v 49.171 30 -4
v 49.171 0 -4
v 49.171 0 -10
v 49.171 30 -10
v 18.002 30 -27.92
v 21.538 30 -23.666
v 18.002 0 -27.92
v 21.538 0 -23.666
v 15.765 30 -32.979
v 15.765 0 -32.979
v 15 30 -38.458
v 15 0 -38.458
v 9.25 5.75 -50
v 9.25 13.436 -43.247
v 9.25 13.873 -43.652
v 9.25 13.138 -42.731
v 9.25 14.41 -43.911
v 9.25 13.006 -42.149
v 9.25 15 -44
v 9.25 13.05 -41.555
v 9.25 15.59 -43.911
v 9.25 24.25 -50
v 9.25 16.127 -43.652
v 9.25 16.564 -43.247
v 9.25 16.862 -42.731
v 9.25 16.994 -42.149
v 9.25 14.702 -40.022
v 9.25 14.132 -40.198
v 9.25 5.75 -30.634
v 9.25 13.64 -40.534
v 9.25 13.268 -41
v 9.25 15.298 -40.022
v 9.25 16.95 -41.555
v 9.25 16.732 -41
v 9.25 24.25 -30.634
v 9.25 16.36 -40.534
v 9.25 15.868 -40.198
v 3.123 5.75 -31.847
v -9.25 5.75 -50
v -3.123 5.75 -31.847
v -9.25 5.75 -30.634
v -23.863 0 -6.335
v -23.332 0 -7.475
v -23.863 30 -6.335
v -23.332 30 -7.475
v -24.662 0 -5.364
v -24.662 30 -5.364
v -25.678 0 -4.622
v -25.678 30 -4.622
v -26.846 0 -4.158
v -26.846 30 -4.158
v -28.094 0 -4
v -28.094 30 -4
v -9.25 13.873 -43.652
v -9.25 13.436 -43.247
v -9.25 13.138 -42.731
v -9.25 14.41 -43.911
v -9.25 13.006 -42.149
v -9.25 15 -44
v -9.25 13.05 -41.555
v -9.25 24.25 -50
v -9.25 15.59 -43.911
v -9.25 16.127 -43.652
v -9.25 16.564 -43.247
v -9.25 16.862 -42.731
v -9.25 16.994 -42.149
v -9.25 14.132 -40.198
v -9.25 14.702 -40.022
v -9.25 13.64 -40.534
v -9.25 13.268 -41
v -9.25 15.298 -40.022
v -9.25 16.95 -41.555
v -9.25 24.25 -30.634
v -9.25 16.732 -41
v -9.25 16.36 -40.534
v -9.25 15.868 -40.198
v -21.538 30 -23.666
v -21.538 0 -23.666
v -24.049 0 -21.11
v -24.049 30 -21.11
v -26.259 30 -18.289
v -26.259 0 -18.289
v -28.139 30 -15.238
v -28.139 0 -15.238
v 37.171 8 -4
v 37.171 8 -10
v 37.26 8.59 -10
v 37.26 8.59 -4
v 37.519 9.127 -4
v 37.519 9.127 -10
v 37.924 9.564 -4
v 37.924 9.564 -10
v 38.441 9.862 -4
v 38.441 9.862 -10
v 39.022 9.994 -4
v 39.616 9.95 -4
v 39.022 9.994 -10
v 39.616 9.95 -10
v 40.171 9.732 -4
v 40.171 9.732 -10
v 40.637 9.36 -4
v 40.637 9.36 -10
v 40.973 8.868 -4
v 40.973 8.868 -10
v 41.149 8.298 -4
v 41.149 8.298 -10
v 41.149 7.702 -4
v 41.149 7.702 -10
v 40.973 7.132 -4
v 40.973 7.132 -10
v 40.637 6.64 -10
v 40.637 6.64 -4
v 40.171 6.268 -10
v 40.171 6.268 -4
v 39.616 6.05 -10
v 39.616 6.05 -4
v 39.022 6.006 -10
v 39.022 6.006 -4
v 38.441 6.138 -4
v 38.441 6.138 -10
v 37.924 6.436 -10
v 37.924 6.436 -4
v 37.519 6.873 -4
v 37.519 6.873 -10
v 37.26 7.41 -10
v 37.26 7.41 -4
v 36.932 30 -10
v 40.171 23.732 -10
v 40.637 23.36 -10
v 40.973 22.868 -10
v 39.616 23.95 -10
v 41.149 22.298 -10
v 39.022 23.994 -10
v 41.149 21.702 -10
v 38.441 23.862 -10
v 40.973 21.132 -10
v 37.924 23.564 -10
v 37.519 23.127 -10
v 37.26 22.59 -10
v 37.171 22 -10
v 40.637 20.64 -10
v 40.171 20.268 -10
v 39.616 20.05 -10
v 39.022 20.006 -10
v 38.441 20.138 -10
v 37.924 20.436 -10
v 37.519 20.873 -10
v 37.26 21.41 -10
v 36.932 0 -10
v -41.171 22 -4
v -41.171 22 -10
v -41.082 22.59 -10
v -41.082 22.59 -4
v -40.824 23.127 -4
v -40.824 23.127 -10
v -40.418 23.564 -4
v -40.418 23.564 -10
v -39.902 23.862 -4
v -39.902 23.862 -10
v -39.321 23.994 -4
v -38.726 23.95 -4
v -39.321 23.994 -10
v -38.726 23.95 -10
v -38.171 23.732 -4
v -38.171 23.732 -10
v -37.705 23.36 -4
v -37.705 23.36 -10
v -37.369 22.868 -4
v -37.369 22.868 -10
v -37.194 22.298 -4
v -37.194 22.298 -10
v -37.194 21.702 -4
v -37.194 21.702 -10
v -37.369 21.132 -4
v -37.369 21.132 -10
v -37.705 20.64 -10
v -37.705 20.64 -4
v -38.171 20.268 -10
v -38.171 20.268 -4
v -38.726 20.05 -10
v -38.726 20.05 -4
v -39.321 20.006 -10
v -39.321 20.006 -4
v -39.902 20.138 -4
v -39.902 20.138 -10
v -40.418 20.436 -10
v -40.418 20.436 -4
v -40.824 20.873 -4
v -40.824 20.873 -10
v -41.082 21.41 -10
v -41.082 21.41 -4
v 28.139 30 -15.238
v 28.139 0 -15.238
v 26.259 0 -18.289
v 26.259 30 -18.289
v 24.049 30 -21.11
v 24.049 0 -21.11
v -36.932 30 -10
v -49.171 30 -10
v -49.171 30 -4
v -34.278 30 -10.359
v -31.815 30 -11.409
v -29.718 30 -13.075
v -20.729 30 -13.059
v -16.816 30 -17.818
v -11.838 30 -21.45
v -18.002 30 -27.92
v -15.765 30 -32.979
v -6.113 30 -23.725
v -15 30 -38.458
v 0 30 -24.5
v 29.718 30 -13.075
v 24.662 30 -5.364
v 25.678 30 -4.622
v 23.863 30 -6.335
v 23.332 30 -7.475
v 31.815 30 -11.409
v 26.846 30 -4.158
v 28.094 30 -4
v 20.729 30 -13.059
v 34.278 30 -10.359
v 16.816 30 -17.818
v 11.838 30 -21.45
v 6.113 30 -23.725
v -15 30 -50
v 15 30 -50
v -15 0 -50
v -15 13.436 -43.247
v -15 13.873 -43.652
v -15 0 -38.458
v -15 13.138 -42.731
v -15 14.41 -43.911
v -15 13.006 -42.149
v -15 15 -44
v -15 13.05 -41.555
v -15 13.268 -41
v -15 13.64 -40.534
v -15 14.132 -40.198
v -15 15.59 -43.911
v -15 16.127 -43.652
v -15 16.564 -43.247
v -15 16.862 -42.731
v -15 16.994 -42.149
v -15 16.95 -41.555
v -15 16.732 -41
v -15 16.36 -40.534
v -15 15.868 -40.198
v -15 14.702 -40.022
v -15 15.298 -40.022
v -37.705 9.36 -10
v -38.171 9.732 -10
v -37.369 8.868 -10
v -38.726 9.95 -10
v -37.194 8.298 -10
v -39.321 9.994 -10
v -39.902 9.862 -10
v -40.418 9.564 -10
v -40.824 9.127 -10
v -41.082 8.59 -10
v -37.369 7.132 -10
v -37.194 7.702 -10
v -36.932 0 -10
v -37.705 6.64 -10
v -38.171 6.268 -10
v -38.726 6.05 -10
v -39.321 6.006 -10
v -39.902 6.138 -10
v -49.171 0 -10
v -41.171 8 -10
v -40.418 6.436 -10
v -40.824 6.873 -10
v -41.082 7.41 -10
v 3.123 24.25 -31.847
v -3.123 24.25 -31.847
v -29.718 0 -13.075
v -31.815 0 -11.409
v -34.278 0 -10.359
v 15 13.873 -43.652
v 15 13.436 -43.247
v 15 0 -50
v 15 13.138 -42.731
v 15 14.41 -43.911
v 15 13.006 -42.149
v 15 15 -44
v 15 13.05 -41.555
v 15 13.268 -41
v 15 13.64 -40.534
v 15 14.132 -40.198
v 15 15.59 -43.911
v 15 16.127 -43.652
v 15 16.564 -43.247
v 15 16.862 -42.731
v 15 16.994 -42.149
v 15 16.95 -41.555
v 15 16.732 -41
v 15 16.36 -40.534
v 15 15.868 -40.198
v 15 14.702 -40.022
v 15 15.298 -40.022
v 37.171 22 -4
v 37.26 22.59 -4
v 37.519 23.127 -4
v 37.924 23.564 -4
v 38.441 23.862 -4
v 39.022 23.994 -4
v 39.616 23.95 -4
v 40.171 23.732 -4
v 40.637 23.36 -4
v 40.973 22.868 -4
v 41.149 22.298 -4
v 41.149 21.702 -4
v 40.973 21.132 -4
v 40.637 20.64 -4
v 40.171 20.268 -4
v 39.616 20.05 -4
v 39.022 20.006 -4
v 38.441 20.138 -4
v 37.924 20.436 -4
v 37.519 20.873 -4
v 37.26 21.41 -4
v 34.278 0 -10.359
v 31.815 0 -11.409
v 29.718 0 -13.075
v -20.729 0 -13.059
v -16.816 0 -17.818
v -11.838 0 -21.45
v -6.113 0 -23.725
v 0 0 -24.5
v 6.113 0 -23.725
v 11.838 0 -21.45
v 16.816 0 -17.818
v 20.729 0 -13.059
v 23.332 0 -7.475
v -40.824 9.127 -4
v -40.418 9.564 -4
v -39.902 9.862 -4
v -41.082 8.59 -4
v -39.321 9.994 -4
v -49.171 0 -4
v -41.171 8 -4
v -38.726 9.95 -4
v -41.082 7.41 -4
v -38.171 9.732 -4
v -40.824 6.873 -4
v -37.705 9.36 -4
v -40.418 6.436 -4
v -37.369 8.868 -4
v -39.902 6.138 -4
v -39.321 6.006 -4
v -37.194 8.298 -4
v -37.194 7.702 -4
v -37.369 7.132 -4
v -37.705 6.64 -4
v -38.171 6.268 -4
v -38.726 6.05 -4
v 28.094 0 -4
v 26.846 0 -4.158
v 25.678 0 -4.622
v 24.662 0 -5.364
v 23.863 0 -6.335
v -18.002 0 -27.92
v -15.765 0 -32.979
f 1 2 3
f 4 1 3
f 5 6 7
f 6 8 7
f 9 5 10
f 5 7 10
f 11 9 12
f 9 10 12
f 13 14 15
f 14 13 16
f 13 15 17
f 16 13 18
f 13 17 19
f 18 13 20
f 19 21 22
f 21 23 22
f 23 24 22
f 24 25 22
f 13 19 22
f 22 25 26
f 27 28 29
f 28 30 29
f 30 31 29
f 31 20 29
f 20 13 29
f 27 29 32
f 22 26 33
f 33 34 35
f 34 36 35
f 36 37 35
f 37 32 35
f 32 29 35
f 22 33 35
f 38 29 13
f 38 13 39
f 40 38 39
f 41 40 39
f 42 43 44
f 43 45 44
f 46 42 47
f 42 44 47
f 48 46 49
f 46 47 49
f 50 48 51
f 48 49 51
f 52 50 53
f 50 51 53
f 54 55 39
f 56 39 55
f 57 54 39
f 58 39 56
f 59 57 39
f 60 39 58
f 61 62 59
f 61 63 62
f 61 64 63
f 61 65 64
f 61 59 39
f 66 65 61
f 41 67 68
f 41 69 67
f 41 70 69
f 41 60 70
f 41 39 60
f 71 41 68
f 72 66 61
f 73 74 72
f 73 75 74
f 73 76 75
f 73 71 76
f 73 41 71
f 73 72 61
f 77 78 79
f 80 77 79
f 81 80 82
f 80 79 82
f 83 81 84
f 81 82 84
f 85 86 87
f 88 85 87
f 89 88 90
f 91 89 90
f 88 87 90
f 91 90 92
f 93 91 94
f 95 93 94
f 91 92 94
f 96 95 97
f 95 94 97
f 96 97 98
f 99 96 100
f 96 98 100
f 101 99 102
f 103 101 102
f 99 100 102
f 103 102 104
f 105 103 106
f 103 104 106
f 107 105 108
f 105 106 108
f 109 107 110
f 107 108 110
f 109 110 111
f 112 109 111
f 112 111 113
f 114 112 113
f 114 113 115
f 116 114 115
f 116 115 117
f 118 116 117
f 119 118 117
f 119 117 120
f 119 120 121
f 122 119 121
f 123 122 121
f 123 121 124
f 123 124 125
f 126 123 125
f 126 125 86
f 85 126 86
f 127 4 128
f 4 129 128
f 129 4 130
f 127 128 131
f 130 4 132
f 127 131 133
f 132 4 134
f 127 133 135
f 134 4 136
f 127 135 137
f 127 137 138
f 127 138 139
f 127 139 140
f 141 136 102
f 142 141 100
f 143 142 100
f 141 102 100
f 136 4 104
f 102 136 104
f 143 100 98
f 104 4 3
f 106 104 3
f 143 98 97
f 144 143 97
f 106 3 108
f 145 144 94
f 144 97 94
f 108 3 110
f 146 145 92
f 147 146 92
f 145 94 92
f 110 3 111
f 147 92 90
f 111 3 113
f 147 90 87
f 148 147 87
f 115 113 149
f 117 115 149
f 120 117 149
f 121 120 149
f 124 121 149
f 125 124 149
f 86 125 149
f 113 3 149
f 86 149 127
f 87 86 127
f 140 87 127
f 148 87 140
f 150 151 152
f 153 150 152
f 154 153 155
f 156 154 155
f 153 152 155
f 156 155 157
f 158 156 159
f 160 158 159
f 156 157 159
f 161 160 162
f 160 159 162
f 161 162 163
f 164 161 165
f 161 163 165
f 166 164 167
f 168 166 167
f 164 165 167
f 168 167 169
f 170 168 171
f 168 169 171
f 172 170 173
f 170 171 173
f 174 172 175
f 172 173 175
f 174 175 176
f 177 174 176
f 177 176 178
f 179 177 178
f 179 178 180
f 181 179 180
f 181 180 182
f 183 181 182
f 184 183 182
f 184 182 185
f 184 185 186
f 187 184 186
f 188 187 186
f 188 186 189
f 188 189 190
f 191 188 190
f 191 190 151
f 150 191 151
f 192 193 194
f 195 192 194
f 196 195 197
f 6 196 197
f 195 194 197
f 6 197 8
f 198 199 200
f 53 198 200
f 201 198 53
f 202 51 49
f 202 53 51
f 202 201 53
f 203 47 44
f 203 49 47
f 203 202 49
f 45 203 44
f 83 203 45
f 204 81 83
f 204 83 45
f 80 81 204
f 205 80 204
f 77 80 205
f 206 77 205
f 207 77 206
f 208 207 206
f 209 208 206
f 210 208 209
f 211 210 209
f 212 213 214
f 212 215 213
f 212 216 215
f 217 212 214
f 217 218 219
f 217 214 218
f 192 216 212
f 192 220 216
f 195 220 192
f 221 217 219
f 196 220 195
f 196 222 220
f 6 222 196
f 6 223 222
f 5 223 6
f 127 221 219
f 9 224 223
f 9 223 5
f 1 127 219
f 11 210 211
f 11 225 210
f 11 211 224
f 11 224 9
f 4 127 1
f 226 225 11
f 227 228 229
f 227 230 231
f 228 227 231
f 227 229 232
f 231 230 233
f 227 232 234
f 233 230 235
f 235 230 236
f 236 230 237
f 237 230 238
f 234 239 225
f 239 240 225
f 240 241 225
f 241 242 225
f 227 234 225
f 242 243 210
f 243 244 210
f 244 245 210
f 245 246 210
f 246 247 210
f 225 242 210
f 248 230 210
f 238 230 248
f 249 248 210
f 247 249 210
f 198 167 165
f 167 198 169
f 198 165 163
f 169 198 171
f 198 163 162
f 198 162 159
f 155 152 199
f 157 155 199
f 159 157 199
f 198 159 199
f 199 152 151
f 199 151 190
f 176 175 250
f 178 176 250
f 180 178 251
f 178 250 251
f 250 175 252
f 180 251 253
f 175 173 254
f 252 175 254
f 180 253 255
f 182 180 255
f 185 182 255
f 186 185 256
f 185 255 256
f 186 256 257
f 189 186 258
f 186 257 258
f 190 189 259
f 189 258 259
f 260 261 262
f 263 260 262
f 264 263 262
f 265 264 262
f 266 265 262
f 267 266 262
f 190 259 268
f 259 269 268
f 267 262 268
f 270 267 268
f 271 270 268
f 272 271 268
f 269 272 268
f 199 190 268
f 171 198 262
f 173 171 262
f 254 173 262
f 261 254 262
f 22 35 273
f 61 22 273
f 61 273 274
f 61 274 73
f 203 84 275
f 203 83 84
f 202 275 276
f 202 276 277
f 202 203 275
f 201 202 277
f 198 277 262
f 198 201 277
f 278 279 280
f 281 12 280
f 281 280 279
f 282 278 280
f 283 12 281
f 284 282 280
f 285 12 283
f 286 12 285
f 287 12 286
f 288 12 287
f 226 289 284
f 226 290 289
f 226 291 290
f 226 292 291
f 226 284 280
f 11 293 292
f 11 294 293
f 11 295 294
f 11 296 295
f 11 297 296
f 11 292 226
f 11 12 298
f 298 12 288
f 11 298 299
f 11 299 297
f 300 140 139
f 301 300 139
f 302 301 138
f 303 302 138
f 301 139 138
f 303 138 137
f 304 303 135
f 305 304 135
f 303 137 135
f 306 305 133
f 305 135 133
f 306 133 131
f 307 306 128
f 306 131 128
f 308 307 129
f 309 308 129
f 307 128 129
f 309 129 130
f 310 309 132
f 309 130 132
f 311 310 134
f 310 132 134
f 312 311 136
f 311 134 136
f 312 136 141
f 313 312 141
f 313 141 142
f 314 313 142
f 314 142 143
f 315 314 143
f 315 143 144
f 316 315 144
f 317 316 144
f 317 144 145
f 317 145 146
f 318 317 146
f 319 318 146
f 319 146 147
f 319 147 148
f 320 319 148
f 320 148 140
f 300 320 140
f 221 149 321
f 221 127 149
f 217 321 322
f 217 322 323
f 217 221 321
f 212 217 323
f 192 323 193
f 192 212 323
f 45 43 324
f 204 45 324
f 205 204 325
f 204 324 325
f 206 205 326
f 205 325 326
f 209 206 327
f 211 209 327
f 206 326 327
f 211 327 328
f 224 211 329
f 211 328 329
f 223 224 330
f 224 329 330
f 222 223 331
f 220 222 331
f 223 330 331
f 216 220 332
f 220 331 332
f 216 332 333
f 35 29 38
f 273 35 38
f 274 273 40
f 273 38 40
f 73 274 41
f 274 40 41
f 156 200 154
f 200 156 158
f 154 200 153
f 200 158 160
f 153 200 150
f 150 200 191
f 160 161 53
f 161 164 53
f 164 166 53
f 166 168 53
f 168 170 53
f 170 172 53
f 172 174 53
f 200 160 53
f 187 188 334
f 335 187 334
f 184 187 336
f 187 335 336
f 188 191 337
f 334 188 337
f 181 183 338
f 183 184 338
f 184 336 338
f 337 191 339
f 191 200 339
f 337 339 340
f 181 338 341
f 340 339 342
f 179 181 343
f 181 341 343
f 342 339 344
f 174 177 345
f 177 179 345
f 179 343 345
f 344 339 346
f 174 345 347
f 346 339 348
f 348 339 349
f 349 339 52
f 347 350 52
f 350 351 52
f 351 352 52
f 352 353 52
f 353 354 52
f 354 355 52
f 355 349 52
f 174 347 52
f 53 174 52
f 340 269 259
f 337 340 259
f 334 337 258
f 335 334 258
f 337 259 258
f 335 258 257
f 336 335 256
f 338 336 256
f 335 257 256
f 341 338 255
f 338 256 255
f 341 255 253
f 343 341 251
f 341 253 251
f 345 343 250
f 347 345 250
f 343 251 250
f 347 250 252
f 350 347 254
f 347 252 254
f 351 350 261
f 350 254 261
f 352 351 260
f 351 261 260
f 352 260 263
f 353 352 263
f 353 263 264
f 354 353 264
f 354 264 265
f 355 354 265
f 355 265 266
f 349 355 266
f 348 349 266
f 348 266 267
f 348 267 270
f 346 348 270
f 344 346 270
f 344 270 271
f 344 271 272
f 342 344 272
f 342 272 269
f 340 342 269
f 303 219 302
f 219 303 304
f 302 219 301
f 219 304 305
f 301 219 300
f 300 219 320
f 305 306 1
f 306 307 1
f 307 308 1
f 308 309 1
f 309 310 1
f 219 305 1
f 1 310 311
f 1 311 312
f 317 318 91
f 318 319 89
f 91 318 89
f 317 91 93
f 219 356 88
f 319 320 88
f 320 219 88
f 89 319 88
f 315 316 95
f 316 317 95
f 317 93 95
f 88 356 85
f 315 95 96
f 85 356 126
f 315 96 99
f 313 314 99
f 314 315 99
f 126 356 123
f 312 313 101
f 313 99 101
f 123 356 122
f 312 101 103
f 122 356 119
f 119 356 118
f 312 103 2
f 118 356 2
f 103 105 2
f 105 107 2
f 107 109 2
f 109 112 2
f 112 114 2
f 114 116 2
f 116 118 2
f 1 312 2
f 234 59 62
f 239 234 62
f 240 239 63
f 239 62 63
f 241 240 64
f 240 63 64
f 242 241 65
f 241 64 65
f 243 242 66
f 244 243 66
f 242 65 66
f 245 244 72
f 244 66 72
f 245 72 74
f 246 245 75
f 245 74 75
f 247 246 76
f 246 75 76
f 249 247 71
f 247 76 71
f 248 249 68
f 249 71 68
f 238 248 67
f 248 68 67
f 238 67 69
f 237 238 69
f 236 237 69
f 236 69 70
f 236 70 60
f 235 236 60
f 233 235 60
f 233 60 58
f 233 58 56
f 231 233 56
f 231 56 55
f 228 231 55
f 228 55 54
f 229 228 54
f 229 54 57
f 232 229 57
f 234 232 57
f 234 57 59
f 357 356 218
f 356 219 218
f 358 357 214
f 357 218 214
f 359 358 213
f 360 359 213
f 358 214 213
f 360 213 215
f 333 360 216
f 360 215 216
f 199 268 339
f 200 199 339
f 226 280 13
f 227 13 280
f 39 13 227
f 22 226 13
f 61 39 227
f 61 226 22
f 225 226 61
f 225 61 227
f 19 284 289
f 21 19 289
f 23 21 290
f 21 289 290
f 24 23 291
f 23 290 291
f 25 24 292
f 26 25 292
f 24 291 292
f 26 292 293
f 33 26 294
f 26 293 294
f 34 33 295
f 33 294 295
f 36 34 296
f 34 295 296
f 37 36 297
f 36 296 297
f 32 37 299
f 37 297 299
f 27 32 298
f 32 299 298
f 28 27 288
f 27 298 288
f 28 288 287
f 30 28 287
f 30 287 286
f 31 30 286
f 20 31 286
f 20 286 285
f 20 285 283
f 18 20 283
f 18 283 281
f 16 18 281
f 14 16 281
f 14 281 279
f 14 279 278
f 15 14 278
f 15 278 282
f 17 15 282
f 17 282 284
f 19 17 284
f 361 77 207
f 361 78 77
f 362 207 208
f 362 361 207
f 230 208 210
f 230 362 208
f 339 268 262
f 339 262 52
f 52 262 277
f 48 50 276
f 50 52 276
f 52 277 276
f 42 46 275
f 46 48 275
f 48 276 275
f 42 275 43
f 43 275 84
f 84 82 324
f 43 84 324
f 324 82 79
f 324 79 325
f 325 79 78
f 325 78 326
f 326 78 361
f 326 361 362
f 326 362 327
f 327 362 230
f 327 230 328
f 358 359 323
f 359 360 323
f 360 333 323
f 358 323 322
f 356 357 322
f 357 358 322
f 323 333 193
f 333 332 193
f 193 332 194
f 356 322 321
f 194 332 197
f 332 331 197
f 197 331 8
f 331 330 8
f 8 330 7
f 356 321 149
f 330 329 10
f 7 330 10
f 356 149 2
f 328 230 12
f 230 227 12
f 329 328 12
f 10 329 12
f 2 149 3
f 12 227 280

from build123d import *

# Parameters (mm, degrees)
BOSS_EXTRUDE1_DEPTH = 30
SKETCH2_R           = 2
CUT_EXTRUDE1_DEPTH  = 7
FILLET1_R           = 10
FILLET2_R           = 5
BOSS_EXTRUDE2_START = 15
SKETCH3_W           = 30
SKETCH3_H           = 30
SKETCH3_W_2         = 18.5
SKETCH3_H_2         = 18.5
BOSS_EXTRUDE2_DEPTH = 25
FILLET3_R           = 20
SKETCH4_R           = 2
CUT_EXTRUDE2_DEPTH  = 30


with BuildPart() as part:
    # Sketch1 → Boss-Extrude1 (new body)
    with BuildSketch(Plane(origin=(0, 0, 0), x_dir=(1, 0, 0), z_dir=(0, 1, 0))):
        with BuildLine():
            ThreePointArc((-24.171263931, 4), (0, 24.5), (24.171263931, 4))
            Line((24.171263931, 4), (49.171263931, 4))
            Line((49.171263931, 4), (49.171263931, 10))
            Line((49.171263931, 10), (30.397368307, 10))
            ThreePointArc((30.397368307, 10), (0, 32), (-30.397368307, 10))
            Line((-30.397368307, 10), (-49.171263931, 10))
            Line((-49.171263931, 10), (-49.171263931, 4))
            Line((-49.171263931, 4), (-24.171263931, 4))
        make_face()
    extrude(amount=BOSS_EXTRUDE1_DEPTH)

    # Sketch2 → Cut-Extrude1 (cut, through all)
    with BuildSketch(Plane(origin=(0, 0, -10), x_dir=(-1, 0, 0), z_dir=(0, 0, -1))):
        with Locations((-39.171263931, 22)):
            Circle(SKETCH2_R)
        with Locations((-39.171263931, 8)):
            Circle(SKETCH2_R)
        with Locations((39.171263931, 8)):
            Circle(SKETCH2_R)
        with Locations((39.171263931, 22)):
            Circle(SKETCH2_R)
    extrude(amount=-CUT_EXTRUDE1_DEPTH, mode=Mode.SUBTRACT)

    # Fillet1
    fillet1_edges = [part.edges().sort_by_distance(p)[0] for p in [
        (-30.397368307, 15, -10),
        (30.397368307, 15, -10),
    ]]
    fillet(fillet1_edges, radius=FILLET1_R)

    # Fillet2
    fillet2_edges = [part.edges().sort_by_distance(p)[0] for p in [
        (-24.171263931, 15, -4),
        (24.171263931, 15, -4),
    ]]
    fillet(fillet2_edges, radius=FILLET2_R)

    # Sketch3 → Boss-Extrude2 (add)
    with BuildSketch(Plane(origin=(0, 0, -10), x_dir=(-1, 0, 0), z_dir=(0, 0, -1)).offset(BOSS_EXTRUDE2_START)):
        with Locations((0, 15)):
            Rectangle(SKETCH3_W, SKETCH3_H)
        with Locations((0, 15)):
            Rectangle(SKETCH3_W_2, SKETCH3_H_2, mode=Mode.SUBTRACT)
    extrude(amount=BOSS_EXTRUDE2_DEPTH)

    # Fillet3
    fillet3_edges = [part.edges().sort_by_distance(p)[0] for p in [
        (-15, 15, -28.26658805),
        (15, 15, -28.26658805),
    ]]
    fillet(fillet3_edges, radius=FILLET3_R)

    # Sketch4 → Cut-Extrude2 (cut)
    with BuildSketch(Plane(origin=(15, 0, 0), x_dir=(0, 0, -1), z_dir=(1, 0, 0))):
        with Locations((42, 15)):
            Circle(SKETCH4_R)
    extrude(amount=-CUT_EXTRUDE2_DEPTH, mode=Mode.SUBTRACT)


solid = part.part
